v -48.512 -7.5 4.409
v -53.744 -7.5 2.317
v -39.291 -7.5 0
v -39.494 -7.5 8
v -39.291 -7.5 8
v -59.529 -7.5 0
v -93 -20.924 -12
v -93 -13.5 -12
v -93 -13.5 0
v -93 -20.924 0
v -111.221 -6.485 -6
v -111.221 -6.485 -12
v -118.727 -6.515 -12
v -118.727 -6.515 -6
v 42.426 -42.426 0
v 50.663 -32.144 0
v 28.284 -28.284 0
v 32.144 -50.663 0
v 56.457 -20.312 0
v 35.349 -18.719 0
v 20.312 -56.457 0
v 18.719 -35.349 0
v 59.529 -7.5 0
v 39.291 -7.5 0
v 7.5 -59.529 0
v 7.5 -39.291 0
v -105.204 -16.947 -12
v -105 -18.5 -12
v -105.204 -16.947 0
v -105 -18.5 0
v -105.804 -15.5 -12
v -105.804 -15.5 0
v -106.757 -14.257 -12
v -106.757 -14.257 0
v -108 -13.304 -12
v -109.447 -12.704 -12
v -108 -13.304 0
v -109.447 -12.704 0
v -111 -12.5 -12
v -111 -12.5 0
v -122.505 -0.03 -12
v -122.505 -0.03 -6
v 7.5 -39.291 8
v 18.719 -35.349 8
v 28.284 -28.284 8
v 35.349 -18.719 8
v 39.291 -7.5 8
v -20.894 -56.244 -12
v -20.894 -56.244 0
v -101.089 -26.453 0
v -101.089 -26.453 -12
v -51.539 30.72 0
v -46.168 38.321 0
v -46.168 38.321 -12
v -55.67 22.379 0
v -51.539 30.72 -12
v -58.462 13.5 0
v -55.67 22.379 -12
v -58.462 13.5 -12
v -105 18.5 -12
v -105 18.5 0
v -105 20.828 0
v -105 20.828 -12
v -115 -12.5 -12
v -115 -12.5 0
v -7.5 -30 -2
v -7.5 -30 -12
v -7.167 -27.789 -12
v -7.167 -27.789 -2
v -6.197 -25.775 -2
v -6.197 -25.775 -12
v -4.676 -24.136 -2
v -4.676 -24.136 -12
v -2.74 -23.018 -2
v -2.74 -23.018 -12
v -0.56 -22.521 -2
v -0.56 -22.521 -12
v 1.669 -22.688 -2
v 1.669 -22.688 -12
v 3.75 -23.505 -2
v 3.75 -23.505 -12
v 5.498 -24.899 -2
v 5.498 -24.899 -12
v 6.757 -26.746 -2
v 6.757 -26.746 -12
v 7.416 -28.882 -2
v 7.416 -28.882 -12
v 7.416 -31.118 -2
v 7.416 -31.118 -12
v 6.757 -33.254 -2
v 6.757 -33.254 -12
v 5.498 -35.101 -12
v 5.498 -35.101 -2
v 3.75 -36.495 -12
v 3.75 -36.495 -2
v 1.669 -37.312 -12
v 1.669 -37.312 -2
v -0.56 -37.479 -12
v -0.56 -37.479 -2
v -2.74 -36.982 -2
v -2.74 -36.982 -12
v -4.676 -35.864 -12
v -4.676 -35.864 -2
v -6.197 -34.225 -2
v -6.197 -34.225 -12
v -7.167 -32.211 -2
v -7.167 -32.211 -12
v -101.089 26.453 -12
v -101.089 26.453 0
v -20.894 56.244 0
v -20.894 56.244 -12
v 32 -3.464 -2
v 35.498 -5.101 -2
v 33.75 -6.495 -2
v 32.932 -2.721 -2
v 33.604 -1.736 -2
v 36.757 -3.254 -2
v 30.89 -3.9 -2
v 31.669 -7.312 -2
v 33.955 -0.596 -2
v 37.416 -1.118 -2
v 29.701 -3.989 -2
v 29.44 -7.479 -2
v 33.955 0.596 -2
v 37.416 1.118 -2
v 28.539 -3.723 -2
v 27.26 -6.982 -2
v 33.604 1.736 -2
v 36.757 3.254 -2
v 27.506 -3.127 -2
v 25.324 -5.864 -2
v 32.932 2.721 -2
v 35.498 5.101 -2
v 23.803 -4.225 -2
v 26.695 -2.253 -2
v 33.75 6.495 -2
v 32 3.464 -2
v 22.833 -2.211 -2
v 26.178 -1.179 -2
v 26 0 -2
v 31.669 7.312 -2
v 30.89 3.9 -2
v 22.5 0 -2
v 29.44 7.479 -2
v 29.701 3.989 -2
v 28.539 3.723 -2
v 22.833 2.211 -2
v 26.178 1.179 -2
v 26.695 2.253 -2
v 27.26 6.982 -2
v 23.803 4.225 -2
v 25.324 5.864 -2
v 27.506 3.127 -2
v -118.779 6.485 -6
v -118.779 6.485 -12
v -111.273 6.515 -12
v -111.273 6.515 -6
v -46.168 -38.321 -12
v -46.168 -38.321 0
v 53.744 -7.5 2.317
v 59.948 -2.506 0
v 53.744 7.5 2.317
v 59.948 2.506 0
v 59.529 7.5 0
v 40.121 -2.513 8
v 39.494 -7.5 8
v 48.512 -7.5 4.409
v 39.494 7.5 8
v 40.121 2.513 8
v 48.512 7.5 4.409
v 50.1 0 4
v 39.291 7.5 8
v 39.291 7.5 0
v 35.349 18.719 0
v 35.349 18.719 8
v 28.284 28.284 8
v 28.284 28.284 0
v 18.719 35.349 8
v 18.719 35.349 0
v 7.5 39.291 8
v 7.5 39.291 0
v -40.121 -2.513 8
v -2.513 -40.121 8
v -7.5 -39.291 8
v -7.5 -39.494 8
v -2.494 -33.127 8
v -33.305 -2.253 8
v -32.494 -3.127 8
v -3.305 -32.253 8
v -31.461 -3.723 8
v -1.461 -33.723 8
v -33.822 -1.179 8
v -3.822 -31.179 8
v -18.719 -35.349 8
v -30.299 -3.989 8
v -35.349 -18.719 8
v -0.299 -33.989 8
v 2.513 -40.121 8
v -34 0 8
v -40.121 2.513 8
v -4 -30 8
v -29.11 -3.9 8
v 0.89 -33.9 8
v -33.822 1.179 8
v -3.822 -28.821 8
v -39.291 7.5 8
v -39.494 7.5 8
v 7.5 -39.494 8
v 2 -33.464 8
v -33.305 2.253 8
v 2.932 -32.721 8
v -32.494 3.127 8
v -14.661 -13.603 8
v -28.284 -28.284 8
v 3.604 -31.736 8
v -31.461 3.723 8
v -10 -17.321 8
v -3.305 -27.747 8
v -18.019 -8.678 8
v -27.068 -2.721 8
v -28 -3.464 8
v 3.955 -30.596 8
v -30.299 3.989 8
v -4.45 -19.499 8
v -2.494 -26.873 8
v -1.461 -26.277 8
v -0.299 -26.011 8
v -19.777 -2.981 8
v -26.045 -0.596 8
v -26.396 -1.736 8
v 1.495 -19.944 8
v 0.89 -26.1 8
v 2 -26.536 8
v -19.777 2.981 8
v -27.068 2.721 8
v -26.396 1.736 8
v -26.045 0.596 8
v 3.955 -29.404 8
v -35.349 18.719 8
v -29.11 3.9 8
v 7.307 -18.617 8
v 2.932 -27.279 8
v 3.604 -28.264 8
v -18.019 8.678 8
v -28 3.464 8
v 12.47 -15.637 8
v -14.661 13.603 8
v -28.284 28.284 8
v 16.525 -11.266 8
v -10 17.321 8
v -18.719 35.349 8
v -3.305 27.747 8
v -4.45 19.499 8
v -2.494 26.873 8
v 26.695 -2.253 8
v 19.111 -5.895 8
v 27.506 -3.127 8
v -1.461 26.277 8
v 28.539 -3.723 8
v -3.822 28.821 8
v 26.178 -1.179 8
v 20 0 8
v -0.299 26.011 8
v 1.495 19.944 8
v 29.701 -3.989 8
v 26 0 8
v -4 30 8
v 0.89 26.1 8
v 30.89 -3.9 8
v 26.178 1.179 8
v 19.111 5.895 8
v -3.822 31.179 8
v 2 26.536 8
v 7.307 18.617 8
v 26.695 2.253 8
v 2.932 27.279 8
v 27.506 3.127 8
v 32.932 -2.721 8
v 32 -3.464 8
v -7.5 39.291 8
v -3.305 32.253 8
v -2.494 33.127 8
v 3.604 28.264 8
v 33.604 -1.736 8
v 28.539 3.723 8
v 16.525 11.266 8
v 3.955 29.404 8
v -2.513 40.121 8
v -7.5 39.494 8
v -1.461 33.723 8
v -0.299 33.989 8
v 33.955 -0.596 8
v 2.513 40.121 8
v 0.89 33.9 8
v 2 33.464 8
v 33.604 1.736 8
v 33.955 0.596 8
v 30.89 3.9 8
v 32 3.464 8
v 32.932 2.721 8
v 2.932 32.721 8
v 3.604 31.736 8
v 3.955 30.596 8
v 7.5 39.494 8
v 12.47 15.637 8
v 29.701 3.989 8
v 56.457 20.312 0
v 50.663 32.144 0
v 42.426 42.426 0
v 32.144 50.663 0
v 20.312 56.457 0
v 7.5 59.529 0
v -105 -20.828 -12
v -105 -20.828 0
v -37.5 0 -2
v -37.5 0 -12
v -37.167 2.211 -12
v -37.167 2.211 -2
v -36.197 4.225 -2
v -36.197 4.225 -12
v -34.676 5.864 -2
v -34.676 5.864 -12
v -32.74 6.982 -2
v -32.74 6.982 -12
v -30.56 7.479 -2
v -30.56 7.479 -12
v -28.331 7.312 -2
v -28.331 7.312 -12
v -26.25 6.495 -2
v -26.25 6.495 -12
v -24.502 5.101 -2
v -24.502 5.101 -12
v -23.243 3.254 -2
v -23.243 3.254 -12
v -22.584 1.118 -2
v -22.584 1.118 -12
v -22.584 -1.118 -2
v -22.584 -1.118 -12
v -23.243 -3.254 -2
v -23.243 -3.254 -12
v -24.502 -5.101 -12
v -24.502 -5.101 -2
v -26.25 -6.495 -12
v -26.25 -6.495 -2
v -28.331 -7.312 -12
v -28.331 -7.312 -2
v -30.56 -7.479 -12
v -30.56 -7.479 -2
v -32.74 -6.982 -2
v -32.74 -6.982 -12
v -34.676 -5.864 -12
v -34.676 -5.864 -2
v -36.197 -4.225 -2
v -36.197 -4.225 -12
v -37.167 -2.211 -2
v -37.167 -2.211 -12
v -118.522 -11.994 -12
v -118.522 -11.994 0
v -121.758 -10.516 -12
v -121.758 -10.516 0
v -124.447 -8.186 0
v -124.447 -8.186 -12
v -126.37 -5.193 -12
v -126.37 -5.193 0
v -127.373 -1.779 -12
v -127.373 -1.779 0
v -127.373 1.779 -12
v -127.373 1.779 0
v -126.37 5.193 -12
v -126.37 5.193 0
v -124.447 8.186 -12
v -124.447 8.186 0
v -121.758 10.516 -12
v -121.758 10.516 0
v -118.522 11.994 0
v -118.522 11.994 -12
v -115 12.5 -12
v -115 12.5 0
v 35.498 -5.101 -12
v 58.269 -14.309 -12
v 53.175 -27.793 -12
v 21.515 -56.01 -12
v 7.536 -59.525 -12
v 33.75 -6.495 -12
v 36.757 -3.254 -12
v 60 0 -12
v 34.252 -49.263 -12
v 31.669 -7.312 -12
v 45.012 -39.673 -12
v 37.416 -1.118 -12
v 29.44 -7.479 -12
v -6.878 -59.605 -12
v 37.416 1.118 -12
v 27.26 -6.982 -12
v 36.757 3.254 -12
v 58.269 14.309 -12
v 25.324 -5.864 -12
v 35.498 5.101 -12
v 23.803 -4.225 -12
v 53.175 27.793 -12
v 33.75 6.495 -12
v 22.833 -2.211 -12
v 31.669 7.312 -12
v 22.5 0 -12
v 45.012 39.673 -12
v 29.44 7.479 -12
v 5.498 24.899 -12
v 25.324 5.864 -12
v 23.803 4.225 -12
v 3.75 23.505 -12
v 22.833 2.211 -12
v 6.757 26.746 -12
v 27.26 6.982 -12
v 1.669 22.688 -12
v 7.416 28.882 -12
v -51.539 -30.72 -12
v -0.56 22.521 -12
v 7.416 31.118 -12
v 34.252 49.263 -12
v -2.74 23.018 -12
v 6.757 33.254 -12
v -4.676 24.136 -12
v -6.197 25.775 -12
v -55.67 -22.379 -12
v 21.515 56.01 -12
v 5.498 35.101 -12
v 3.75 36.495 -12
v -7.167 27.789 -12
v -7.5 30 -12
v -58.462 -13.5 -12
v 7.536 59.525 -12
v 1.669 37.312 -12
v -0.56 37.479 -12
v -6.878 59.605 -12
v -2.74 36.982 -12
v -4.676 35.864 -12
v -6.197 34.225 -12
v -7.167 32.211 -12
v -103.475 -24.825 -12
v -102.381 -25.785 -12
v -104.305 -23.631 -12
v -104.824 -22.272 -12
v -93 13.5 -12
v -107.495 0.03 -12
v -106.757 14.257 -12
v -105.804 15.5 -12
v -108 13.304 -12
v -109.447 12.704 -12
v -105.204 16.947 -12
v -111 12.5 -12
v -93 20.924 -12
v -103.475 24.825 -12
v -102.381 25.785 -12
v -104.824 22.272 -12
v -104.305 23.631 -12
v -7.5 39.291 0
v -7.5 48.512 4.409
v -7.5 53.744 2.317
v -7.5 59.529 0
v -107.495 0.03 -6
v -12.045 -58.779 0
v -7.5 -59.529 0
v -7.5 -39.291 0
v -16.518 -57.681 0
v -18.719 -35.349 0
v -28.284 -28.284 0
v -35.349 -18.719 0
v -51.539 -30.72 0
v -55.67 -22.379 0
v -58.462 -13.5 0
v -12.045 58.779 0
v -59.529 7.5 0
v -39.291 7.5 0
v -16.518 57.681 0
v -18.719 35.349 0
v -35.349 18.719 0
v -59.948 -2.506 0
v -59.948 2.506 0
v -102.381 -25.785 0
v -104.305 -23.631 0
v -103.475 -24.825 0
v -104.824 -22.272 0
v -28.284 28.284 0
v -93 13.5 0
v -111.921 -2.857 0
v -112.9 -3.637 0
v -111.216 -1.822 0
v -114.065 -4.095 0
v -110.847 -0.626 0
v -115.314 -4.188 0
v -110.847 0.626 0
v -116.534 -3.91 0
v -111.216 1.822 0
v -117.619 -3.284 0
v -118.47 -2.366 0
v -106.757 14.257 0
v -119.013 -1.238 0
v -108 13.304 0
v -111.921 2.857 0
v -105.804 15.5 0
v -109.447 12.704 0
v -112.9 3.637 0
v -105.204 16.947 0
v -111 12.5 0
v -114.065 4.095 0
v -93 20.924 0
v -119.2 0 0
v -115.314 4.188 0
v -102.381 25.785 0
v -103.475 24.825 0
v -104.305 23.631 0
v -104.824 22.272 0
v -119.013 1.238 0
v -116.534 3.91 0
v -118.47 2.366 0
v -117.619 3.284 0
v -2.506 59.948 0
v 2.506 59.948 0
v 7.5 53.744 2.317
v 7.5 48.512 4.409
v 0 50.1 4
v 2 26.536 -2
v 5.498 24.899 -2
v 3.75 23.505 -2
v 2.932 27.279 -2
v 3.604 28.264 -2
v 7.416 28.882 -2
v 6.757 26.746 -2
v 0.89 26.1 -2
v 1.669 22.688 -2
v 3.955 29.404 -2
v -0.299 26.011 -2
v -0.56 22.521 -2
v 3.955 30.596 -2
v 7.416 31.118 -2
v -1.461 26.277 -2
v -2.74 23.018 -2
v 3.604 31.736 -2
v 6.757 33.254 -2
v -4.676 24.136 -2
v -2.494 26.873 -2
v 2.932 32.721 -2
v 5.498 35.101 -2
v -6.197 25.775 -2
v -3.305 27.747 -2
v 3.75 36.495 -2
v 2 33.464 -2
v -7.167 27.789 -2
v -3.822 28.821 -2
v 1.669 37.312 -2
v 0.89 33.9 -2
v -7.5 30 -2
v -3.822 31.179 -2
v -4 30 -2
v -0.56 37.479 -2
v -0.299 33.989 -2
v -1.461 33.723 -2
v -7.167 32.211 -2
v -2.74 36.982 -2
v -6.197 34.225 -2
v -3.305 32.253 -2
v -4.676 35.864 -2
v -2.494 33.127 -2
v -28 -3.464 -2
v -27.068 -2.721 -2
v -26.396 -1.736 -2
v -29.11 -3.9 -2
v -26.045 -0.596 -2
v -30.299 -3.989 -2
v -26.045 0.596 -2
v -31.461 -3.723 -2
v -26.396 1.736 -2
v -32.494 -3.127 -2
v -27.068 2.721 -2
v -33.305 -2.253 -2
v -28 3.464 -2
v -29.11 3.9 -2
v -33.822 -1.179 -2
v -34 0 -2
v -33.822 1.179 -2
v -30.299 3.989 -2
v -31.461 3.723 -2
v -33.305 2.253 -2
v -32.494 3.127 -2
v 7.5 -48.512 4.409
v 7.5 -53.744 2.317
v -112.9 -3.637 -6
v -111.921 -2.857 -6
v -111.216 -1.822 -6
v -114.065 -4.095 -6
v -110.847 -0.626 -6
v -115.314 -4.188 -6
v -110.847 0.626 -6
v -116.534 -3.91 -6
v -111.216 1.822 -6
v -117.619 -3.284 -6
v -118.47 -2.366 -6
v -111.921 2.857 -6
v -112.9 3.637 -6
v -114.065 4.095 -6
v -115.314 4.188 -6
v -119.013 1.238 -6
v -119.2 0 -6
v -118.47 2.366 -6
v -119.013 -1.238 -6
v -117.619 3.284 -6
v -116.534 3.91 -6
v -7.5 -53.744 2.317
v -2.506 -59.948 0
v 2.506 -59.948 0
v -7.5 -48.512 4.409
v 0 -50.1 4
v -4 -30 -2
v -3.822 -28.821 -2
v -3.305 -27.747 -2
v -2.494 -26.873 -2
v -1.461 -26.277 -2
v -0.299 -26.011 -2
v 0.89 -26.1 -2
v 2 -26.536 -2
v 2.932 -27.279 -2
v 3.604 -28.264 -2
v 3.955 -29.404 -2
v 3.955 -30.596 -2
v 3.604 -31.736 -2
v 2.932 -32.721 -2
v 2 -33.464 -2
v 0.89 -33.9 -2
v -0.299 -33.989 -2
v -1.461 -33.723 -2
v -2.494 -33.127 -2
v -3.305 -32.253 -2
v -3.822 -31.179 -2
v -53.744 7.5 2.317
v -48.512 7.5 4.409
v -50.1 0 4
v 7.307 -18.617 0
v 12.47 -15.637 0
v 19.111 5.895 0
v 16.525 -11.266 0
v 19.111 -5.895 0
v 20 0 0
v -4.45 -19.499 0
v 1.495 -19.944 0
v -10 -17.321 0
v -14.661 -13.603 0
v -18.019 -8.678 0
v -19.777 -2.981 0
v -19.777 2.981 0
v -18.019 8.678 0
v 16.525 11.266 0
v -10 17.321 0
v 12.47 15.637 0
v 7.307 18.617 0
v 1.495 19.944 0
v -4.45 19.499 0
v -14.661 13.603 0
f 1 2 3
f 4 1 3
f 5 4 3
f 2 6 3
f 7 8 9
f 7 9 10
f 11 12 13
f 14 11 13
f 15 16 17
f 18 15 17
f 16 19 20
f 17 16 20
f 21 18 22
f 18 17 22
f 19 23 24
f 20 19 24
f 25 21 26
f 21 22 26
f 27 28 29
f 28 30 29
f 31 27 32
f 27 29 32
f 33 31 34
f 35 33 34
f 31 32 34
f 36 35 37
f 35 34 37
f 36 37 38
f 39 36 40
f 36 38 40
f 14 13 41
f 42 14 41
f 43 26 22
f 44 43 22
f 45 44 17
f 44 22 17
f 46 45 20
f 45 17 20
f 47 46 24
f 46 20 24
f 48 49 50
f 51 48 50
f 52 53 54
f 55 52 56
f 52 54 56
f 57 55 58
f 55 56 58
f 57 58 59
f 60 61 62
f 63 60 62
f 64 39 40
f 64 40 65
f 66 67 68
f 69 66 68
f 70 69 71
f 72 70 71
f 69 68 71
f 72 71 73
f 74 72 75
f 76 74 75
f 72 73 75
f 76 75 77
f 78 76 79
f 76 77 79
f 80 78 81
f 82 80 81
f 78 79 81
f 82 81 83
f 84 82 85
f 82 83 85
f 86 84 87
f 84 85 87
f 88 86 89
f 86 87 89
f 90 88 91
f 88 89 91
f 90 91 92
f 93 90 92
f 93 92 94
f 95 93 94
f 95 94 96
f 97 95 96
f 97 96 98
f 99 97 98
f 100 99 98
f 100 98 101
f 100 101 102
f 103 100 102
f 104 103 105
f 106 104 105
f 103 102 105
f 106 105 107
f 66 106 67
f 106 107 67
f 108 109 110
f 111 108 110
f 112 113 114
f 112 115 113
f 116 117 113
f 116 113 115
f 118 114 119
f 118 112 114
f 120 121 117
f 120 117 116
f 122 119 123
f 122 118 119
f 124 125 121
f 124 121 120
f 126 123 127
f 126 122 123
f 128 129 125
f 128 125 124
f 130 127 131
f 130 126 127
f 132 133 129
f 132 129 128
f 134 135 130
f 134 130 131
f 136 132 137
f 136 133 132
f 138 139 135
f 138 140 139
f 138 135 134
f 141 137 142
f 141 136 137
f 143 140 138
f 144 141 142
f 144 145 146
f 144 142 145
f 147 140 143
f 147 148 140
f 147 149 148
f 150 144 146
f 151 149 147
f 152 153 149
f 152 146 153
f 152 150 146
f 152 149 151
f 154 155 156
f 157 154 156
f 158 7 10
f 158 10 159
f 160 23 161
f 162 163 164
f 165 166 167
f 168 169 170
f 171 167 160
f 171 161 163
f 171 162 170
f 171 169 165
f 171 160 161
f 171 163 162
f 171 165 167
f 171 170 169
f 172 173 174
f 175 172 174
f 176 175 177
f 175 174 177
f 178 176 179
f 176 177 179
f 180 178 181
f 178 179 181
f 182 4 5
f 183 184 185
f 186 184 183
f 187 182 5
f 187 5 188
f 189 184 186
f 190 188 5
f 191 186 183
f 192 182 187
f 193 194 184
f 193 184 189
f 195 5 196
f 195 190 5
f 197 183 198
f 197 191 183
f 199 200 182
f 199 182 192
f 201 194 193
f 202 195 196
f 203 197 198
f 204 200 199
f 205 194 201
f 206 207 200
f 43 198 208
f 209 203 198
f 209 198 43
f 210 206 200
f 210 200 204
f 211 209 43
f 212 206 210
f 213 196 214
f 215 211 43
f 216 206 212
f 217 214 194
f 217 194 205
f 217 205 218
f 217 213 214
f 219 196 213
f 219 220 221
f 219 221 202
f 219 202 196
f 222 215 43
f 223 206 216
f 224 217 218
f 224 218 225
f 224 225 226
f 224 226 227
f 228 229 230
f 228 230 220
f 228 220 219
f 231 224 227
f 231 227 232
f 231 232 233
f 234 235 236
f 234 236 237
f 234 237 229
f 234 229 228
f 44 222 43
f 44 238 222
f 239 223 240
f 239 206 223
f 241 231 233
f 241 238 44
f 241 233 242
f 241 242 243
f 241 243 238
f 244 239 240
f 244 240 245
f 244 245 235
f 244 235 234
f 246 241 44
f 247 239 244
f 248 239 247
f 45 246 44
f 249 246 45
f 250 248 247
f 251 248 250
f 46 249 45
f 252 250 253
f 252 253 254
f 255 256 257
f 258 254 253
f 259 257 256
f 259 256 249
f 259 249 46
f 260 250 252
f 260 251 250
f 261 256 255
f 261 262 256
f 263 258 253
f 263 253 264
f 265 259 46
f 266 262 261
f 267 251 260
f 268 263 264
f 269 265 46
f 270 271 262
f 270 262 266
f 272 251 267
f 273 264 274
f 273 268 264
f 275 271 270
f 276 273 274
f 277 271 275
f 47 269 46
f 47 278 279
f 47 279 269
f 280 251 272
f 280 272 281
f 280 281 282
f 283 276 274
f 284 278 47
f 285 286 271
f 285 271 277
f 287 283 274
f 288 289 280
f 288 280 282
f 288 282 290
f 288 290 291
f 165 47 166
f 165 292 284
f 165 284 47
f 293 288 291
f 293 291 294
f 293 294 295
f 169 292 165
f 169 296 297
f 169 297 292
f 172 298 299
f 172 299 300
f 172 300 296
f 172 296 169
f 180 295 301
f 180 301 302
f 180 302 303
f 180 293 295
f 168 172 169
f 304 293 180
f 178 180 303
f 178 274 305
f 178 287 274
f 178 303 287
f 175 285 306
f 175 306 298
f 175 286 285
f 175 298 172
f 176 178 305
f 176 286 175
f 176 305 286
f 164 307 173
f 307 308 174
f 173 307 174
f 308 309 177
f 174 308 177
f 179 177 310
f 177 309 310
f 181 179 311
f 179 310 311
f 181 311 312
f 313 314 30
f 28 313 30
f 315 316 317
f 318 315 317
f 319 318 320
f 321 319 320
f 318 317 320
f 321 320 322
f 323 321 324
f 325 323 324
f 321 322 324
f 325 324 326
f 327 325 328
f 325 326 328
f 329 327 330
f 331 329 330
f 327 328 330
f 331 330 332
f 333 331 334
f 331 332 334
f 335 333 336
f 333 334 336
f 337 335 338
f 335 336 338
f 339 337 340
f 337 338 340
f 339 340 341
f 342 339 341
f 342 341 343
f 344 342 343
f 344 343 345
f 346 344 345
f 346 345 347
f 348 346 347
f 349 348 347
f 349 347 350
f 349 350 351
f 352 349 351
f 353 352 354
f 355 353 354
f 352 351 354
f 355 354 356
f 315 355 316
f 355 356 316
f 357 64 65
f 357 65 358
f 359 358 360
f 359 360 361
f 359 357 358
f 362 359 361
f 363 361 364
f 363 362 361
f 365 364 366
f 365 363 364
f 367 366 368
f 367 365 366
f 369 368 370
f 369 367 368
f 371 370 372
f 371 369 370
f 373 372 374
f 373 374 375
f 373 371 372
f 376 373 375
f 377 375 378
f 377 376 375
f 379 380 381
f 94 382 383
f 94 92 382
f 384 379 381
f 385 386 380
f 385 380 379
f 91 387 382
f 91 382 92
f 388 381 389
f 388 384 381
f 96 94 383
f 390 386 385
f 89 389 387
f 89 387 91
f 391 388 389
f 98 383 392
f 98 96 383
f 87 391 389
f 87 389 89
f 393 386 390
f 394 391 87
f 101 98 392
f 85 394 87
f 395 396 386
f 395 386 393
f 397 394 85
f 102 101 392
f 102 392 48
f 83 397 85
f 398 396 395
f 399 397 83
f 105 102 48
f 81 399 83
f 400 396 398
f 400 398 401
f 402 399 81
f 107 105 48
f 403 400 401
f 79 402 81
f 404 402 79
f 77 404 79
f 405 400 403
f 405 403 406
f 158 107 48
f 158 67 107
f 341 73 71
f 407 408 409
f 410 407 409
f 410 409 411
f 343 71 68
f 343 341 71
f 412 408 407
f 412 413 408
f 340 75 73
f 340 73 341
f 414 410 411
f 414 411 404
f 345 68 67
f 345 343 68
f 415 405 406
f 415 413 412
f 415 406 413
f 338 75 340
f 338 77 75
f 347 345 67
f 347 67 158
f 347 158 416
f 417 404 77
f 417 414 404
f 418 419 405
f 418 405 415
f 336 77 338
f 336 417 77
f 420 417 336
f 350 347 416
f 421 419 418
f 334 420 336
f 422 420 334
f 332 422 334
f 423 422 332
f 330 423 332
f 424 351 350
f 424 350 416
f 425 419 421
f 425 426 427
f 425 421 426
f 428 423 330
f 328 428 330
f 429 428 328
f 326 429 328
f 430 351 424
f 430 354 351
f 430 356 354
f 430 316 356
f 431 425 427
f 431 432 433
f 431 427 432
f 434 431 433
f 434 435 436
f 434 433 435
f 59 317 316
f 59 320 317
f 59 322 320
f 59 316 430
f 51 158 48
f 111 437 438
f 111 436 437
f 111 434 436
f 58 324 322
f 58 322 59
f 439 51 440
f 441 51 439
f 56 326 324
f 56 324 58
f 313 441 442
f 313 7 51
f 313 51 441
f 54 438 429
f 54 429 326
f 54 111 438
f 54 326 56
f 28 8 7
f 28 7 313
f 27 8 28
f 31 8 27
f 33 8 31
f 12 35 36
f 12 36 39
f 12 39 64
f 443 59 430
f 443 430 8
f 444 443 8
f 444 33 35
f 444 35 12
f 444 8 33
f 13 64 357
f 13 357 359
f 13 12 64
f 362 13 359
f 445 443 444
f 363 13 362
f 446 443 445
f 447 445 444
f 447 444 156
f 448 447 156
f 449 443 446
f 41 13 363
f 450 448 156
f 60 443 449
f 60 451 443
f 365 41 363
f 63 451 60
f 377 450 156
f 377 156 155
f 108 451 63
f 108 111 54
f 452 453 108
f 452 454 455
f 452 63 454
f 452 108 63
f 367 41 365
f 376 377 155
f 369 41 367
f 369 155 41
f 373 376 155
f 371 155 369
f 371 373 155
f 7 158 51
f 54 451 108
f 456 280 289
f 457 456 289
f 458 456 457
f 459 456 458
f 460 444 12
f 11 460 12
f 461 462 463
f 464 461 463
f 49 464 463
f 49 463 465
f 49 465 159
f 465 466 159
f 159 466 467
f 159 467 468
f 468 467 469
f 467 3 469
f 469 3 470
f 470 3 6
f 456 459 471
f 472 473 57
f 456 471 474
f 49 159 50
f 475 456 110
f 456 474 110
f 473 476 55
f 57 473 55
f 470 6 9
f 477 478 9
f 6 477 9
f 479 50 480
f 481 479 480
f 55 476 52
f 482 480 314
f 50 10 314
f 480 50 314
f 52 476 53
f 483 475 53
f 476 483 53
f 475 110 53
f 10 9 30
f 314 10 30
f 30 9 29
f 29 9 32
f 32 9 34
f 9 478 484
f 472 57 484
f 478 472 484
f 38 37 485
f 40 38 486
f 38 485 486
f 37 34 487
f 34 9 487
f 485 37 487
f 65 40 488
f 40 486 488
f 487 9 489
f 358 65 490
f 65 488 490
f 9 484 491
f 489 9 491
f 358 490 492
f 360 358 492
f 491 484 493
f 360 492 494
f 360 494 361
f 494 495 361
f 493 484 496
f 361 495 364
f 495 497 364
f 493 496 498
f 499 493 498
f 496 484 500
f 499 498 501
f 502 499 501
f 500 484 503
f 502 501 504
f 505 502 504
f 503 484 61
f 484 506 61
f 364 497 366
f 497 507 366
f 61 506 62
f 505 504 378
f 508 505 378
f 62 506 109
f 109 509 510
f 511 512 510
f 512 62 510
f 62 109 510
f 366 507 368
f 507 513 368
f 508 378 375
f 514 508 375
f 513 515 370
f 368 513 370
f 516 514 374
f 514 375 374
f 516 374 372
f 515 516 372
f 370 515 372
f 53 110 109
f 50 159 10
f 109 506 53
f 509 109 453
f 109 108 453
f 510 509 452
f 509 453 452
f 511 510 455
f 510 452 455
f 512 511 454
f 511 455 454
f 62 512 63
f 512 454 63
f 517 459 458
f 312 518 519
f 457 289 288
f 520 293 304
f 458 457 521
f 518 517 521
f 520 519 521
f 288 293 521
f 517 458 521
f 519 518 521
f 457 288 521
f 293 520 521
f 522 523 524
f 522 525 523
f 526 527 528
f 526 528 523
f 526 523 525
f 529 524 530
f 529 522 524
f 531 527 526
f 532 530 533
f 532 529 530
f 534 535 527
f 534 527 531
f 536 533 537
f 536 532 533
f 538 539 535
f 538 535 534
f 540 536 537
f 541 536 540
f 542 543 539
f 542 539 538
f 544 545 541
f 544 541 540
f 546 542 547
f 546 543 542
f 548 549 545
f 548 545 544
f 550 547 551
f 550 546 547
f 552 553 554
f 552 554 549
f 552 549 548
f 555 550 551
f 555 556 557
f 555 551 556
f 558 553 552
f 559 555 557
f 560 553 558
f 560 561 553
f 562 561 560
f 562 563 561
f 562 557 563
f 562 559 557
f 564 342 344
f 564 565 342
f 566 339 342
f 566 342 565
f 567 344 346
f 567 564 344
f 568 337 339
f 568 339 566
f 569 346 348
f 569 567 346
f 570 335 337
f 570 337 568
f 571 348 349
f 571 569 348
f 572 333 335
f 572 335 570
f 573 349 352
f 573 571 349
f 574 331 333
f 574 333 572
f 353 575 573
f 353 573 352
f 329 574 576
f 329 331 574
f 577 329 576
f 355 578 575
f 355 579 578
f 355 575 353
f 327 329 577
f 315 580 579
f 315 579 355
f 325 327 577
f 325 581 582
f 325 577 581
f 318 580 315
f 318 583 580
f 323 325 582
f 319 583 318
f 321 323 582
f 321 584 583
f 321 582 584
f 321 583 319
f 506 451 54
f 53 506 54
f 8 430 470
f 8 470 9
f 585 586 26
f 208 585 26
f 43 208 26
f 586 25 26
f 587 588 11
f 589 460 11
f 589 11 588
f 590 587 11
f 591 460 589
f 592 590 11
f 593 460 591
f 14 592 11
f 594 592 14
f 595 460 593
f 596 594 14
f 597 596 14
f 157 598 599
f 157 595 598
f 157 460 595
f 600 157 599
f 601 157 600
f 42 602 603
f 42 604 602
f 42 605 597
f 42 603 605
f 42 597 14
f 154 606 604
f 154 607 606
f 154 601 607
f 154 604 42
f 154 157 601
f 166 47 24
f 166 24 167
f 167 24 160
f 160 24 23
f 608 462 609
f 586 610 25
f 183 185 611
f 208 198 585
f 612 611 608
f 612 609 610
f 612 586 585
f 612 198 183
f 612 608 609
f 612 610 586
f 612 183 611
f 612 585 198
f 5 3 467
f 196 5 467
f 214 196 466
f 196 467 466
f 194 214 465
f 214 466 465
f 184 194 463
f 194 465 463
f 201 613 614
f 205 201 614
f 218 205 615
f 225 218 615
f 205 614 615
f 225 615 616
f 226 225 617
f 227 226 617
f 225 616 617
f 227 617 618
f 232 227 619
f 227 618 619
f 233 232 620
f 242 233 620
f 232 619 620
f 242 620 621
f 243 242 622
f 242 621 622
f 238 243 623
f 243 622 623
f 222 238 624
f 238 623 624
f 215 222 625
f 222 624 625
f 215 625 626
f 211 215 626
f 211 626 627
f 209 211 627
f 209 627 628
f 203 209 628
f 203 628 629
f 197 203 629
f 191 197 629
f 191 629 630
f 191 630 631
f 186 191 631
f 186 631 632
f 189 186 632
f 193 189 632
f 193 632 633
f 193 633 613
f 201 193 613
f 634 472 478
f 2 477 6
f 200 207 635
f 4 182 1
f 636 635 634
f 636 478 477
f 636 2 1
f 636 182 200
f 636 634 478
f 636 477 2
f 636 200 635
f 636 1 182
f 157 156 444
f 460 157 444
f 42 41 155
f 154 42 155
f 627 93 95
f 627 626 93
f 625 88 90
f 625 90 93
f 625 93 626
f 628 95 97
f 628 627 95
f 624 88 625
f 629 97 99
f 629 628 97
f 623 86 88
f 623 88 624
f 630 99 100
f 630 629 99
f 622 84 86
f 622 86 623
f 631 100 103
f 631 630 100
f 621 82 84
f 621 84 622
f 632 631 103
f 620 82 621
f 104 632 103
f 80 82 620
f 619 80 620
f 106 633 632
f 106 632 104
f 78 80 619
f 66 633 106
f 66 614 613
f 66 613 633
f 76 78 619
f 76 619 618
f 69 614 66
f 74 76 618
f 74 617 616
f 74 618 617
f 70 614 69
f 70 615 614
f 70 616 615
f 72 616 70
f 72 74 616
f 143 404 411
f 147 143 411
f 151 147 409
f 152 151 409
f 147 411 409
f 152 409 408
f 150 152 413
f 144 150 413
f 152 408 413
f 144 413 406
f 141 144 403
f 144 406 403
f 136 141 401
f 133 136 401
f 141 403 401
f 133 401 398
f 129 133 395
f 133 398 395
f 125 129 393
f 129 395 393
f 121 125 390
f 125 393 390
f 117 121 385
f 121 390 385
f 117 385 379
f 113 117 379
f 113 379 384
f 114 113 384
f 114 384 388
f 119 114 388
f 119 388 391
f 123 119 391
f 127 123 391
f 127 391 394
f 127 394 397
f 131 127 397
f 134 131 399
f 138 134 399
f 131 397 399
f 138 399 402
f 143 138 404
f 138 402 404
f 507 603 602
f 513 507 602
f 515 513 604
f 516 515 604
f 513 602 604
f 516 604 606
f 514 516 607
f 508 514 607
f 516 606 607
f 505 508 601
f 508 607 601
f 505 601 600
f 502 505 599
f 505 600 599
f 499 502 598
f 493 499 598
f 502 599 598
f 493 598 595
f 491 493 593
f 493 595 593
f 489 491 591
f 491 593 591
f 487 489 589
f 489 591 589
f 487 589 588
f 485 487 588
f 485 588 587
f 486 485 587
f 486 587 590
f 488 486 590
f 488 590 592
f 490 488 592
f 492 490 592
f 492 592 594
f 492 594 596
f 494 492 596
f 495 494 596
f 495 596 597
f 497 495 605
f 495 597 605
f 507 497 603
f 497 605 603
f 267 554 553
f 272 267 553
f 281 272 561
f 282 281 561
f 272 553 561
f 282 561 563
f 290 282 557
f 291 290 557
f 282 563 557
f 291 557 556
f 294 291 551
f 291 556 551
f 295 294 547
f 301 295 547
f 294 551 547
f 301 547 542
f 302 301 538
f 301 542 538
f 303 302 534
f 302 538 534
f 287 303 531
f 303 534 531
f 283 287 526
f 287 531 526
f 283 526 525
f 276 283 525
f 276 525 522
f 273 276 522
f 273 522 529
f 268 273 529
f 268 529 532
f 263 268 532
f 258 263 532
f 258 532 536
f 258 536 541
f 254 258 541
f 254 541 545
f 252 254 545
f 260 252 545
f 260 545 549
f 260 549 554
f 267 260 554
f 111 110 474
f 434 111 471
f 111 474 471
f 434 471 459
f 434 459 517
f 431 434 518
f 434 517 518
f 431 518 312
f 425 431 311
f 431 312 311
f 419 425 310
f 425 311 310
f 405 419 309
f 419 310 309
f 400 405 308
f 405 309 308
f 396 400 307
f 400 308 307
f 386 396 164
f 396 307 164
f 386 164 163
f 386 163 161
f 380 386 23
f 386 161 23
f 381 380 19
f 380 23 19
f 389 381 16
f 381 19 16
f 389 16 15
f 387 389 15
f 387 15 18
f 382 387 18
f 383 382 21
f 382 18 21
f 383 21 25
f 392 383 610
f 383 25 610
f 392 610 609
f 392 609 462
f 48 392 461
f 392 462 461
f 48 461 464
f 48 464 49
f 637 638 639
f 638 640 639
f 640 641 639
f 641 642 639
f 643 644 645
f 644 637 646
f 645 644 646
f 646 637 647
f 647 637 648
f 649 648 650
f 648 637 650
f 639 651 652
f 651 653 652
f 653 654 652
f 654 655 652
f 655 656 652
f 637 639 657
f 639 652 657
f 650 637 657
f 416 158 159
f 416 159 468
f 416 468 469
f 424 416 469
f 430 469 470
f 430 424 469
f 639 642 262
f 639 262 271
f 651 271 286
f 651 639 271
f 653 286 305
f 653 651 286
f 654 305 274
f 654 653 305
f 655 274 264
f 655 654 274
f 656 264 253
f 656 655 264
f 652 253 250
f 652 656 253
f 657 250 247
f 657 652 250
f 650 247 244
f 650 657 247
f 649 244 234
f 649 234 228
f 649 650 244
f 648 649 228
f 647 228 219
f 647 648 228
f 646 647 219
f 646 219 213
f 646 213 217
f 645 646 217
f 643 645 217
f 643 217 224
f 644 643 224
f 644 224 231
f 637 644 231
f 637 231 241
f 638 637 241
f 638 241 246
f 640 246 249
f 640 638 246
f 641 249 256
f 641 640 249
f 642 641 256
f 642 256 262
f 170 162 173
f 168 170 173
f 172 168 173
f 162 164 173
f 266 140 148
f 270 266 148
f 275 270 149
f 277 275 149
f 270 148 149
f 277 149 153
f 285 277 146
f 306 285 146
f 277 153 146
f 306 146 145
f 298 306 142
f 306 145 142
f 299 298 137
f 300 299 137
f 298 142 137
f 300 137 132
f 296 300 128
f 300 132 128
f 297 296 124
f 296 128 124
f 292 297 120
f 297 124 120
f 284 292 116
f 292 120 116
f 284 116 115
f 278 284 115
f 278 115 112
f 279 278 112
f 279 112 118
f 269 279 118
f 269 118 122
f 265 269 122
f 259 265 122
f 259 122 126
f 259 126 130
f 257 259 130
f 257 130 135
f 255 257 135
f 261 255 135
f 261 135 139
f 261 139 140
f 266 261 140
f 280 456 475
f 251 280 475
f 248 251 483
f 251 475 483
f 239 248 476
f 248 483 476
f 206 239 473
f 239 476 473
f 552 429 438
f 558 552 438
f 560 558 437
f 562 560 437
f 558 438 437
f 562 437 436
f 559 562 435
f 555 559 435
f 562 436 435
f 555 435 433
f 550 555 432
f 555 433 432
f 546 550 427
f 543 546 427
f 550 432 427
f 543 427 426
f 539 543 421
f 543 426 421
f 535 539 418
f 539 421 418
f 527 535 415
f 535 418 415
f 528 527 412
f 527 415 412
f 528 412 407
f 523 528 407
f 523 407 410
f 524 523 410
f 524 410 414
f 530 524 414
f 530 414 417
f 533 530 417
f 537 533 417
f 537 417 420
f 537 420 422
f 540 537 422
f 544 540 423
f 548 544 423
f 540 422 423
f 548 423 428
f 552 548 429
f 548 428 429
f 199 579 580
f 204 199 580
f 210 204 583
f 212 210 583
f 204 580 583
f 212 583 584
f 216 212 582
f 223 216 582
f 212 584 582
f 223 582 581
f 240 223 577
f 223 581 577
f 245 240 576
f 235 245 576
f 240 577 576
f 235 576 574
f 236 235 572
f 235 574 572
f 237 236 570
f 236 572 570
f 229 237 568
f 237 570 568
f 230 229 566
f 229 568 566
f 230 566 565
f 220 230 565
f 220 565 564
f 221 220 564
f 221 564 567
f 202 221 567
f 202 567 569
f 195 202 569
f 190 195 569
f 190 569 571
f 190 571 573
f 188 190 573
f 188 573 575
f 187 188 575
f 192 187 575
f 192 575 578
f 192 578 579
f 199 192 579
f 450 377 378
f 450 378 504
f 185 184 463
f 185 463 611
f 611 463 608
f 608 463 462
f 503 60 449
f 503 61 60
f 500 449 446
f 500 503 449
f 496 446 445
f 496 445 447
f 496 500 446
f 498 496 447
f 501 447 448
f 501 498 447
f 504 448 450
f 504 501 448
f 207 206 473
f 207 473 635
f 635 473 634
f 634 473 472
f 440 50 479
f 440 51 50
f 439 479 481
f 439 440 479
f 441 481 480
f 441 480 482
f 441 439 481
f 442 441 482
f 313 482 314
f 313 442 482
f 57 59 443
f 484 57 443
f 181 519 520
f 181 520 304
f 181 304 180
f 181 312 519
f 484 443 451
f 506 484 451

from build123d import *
from OCP.BRepFilletAPI import BRepFilletAPI_MakeChamfer
from build123d.topology import SkipClean

# Parameters (mm, degrees)
SKETCH2_R           = 40
SKETCH2_R_2         = 20
BOSS_EXTRUDE1_DEPTH = 8
BOSS_EXTRUDE2_DEPTH = 12
SKETCH4_R           = 7.5
CUT_EXTRUDE1_DEPTH  = 10
SKETCH5_R           = 4
CUT_EXTRUDE2_DEPTH  = 29
BOSS_EXTRUDE3_DEPTH = 8
CHAMFER3_SIZE       = 8
CHAMFER3_SIZE_2     = 19.800694827
BOSS_EXTRUDE4_DEPTH = 12
FILLET1_R           = 6
CUT_EXTRUDE3_DEPTH  = 6
SKETCH9_R           = 4.2
CUT_EXTRUDE4_DEPTH  = 6
CUT_EXTRUDE5_START  = -22
CUT_EXTRUDE5_DEPTH  = 22


with BuildPart() as part:
    # Sketch2 → Boss-Extrude1 (new body)
    with BuildSketch(Plane.XY):
        Circle(SKETCH2_R)
        Circle(SKETCH2_R_2, mode=Mode.SUBTRACT)
    extrude(amount=BOSS_EXTRUDE1_DEPTH)

    # Sketch3 → Boss-Extrude2 (add)
    with BuildSketch(Plane(origin=(0, 0, 0), x_dir=(-1, 0, 0), z_dir=(0, 0, -1))):
        with BuildLine():
            Line((105, -25), (105, 25))
            Line((105, 25), (20.894189842, 56.244402662))
            ThreePointArc((20.894189842, 56.244402662), (-60, 0), (20.894189842, -56.244402662))
            Line((20.894189842, -56.244402662), (105, -25))
        make_face()
    extrude(amount=BOSS_EXTRUDE2_DEPTH)

    # Sketch4 → Cut-Extrude1 (cut)
    with BuildSketch(Plane(origin=(0, 0, -12), x_dir=(-1, 0, 0), z_dir=(0, 0, -1))):
        with Locations((0, 30)):
            Circle(SKETCH4_R)
        with Locations((30, 0)):
            Circle(SKETCH4_R)
        with Locations((0, -30)):
            Circle(SKETCH4_R)
        with Locations((-30, 0)):
            Circle(SKETCH4_R)
    extrude(amount=-CUT_EXTRUDE1_DEPTH, mode=Mode.SUBTRACT)

    # Sketch5 → Cut-Extrude2 (cut)
    with BuildSketch(Plane(origin=(0, 0, -2), x_dir=(-1, 0, 0), z_dir=(0, 0, -1))):
        with Locations((30, 0)):
            Circle(SKETCH5_R)
        with Locations((0, -30)):
            Circle(SKETCH5_R)
        with Locations((-30, 0)):
            Circle(SKETCH5_R)
        with Locations((0, 30)):
            Circle(SKETCH5_R)
    extrude(amount=-CUT_EXTRUDE2_DEPTH, mode=Mode.SUBTRACT)

    # Sketch6 → Boss-Extrude3 (add)
    with SkipClean():  # the faces are left unmerged after this step: merging them gives an invalid solid
        with BuildSketch(Plane.XY):
            with BuildLine():
                Line((39.290584114, -7.5), (59.529404499, -7.5))
                ThreePointArc((59.529404499, -7.5), (60, 0), (59.529404499, 7.5))
                Line((59.529404499, 7.5), (39.290584114, 7.5))
                ThreePointArc((39.290584114, 7.5), (40, 0), (39.290584114, -7.5))
            make_face()
            with BuildLine():
                Line((-7.5, 39.290584114), (-7.5, 59.529404499))
                ThreePointArc((-7.5, 59.529404499), (0, 60), (7.5, 59.529404499))
                Line((7.5, 59.529404499), (7.5, 39.290584114))
                ThreePointArc((7.5, 39.290584114), (0, 40), (-7.5, 39.290584114))
            make_face()
            with BuildLine():
                Line((-7.5, -39.290584114), (-7.5, -59.529404499))
                ThreePointArc((-7.5, -59.529404499), (0, -60), (7.5, -59.529404499))
                Line((7.5, -59.529404499), (7.5, -39.290584114))
                ThreePointArc((7.5, -39.290584114), (0, -40), (-7.5, -39.290584114))
            make_face()
            with BuildLine():
                Line((-39.290584114, 7.5), (-59.529404499, 7.5))
                ThreePointArc((-59.529404499, 7.5), (-60, 0), (-59.529404499, -7.5))
                Line((-59.529404499, -7.5), (-39.290584114, -7.5))
                ThreePointArc((-39.290584114, -7.5), (-40, 0), (-39.290584114, 7.5))
            make_face()
        extrude(amount=BOSS_EXTRUDE3_DEPTH)

    # Chamfer3
    chamfer3_edges_1 = [part.edges().sort_by_distance(p)[0] for p in [
        (0, 60, 8),
    ]]
    chamfer3_side_1 = [part.faces().sort_by_distance(p)[0] for p in [
        (0, 60, 7.84),
    ]]
    chamfer3_edges_2 = [part.edges().sort_by_distance(p)[0] for p in [
        (60, 0, 8),
    ]]
    chamfer3_side_2 = [part.faces().sort_by_distance(p)[0] for p in [
        (60, 0, 7.84),
    ]]
    chamfer3_edges_3 = [part.edges().sort_by_distance(p)[0] for p in [
        (-60, 0, 8),
    ]]
    chamfer3_side_3 = [part.faces().sort_by_distance(p)[0] for p in [
        (-60, 0, 7.84),
    ]]
    chamfer3_edges_4 = [part.edges().sort_by_distance(p)[0] for p in [
        (0, -60, 8),
    ]]
    chamfer3_side_4 = [part.faces().sort_by_distance(p)[0] for p in [
        (0, -60, 7.84),
    ]]
    chamfer3 = BRepFilletAPI_MakeChamfer(part.part.solid().wrapped)
    for e in chamfer3_edges_1:
        chamfer3.Add(CHAMFER3_SIZE - 0.0001, CHAMFER3_SIZE_2 - 0.0001, e.wrapped, chamfer3_side_1[0].wrapped)
    for e in chamfer3_edges_2:
        chamfer3.Add(CHAMFER3_SIZE - 0.0001, CHAMFER3_SIZE_2 - 0.0001, e.wrapped, chamfer3_side_2[0].wrapped)
    for e in chamfer3_edges_3:
        chamfer3.Add(CHAMFER3_SIZE - 0.0001, CHAMFER3_SIZE_2 - 0.0001, e.wrapped, chamfer3_side_3[0].wrapped)
    for e in chamfer3_edges_4:
        chamfer3.Add(CHAMFER3_SIZE - 0.0001, CHAMFER3_SIZE_2 - 0.0001, e.wrapped, chamfer3_side_4[0].wrapped)
    add(Compound.cast(chamfer3.Shape()), mode=Mode.REPLACE)  # a hair under: the kernel refuses the full size

    # Sketch7 → Boss-Extrude4 (add)
    with BuildSketch(Plane(origin=(0, 0, -12), x_dir=(-1, 0, 0), z_dir=(0, 0, -1))):
        with BuildLine():
            Line((115, 12.5), (105, 12.5))
            Line((105, 12.5), (105, -12.5))
            Line((105, -12.5), (115, -12.5))
            ThreePointArc((115, -12.5), (127.5, 0), (115, 12.5))
        make_face()
    extrude(amount=-BOSS_EXTRUDE4_DEPTH)

    # Fillet1
    fillet1_edges = [part.edges().sort_by_distance(p)[0] for p in [
        (-105, -25, -6),
        (-105, 25, -6),
        (-105, -12.5, -6),
        (-105, 12.5, -6),
    ]]
    fillet(fillet1_edges, radius=FILLET1_R)

    # Sketch8 → Cut-Extrude3 (cut)
    with SkipClean():  # the faces are left unmerged after this step: merging them gives an invalid solid
        with BuildSketch(Plane(origin=(0, 0, -12), x_dir=(-1, 0, 0), z_dir=(0, 0, -1))):
            Polygon((118.778590974, 6.485027647), (111.2730968, 6.514869597), (107.494505826, 0.02984195), (111.221409026, -6.485027647), (118.7269032, -6.514869597), (122.505494174, -0.02984195), align=None)
        extrude(amount=-CUT_EXTRUDE3_DEPTH, mode=Mode.SUBTRACT)

    # Sketch9 → Cut-Extrude4 (cut)
    with SkipClean():  # the faces are left unmerged after this step: merging them gives an invalid solid
        with BuildSketch(Plane(origin=(0, 0, -6), x_dir=(-1, 0, 0), z_dir=(0, 0, -1))):
            with Locations((115, 0)):
                Circle(SKETCH9_R)
        extrude(amount=-CUT_EXTRUDE4_DEPTH, mode=Mode.SUBTRACT)

    # Sketch10 → Cut-Extrude5 (cut)
    with SkipClean():  # the faces are left unmerged after this step: merging them gives an invalid solid
        with BuildSketch(Plane.XY.offset(CUT_EXTRUDE5_START)):
            with BuildLine():
                Line((-58.46152581, -13.5), (-93, -13.5))
                Line((-93, -13.5), (-93, -20.923688206))
                Line((-93, -20.923688206), (-46.167935821, -38.321295672))
                ThreePointArc((-46.167935821, -38.321295672), (-53.766674065, -26.62977206), (-58.46152581, -13.5))
            make_face()
            with BuildLine():
                Line((-93, 20.923688206), (-46.167935821, 38.321295672))
                ThreePointArc((-46.167935821, 38.321295672), (-53.766674065, 26.62977206), (-58.46152581, 13.5))
                Line((-58.46152581, 13.5), (-93, 13.5))
                Line((-93, 13.5), (-93, 20.923688206))
            make_face()
        extrude(amount=CUT_EXTRUDE5_DEPTH, mode=Mode.SUBTRACT)


solid = part.part
